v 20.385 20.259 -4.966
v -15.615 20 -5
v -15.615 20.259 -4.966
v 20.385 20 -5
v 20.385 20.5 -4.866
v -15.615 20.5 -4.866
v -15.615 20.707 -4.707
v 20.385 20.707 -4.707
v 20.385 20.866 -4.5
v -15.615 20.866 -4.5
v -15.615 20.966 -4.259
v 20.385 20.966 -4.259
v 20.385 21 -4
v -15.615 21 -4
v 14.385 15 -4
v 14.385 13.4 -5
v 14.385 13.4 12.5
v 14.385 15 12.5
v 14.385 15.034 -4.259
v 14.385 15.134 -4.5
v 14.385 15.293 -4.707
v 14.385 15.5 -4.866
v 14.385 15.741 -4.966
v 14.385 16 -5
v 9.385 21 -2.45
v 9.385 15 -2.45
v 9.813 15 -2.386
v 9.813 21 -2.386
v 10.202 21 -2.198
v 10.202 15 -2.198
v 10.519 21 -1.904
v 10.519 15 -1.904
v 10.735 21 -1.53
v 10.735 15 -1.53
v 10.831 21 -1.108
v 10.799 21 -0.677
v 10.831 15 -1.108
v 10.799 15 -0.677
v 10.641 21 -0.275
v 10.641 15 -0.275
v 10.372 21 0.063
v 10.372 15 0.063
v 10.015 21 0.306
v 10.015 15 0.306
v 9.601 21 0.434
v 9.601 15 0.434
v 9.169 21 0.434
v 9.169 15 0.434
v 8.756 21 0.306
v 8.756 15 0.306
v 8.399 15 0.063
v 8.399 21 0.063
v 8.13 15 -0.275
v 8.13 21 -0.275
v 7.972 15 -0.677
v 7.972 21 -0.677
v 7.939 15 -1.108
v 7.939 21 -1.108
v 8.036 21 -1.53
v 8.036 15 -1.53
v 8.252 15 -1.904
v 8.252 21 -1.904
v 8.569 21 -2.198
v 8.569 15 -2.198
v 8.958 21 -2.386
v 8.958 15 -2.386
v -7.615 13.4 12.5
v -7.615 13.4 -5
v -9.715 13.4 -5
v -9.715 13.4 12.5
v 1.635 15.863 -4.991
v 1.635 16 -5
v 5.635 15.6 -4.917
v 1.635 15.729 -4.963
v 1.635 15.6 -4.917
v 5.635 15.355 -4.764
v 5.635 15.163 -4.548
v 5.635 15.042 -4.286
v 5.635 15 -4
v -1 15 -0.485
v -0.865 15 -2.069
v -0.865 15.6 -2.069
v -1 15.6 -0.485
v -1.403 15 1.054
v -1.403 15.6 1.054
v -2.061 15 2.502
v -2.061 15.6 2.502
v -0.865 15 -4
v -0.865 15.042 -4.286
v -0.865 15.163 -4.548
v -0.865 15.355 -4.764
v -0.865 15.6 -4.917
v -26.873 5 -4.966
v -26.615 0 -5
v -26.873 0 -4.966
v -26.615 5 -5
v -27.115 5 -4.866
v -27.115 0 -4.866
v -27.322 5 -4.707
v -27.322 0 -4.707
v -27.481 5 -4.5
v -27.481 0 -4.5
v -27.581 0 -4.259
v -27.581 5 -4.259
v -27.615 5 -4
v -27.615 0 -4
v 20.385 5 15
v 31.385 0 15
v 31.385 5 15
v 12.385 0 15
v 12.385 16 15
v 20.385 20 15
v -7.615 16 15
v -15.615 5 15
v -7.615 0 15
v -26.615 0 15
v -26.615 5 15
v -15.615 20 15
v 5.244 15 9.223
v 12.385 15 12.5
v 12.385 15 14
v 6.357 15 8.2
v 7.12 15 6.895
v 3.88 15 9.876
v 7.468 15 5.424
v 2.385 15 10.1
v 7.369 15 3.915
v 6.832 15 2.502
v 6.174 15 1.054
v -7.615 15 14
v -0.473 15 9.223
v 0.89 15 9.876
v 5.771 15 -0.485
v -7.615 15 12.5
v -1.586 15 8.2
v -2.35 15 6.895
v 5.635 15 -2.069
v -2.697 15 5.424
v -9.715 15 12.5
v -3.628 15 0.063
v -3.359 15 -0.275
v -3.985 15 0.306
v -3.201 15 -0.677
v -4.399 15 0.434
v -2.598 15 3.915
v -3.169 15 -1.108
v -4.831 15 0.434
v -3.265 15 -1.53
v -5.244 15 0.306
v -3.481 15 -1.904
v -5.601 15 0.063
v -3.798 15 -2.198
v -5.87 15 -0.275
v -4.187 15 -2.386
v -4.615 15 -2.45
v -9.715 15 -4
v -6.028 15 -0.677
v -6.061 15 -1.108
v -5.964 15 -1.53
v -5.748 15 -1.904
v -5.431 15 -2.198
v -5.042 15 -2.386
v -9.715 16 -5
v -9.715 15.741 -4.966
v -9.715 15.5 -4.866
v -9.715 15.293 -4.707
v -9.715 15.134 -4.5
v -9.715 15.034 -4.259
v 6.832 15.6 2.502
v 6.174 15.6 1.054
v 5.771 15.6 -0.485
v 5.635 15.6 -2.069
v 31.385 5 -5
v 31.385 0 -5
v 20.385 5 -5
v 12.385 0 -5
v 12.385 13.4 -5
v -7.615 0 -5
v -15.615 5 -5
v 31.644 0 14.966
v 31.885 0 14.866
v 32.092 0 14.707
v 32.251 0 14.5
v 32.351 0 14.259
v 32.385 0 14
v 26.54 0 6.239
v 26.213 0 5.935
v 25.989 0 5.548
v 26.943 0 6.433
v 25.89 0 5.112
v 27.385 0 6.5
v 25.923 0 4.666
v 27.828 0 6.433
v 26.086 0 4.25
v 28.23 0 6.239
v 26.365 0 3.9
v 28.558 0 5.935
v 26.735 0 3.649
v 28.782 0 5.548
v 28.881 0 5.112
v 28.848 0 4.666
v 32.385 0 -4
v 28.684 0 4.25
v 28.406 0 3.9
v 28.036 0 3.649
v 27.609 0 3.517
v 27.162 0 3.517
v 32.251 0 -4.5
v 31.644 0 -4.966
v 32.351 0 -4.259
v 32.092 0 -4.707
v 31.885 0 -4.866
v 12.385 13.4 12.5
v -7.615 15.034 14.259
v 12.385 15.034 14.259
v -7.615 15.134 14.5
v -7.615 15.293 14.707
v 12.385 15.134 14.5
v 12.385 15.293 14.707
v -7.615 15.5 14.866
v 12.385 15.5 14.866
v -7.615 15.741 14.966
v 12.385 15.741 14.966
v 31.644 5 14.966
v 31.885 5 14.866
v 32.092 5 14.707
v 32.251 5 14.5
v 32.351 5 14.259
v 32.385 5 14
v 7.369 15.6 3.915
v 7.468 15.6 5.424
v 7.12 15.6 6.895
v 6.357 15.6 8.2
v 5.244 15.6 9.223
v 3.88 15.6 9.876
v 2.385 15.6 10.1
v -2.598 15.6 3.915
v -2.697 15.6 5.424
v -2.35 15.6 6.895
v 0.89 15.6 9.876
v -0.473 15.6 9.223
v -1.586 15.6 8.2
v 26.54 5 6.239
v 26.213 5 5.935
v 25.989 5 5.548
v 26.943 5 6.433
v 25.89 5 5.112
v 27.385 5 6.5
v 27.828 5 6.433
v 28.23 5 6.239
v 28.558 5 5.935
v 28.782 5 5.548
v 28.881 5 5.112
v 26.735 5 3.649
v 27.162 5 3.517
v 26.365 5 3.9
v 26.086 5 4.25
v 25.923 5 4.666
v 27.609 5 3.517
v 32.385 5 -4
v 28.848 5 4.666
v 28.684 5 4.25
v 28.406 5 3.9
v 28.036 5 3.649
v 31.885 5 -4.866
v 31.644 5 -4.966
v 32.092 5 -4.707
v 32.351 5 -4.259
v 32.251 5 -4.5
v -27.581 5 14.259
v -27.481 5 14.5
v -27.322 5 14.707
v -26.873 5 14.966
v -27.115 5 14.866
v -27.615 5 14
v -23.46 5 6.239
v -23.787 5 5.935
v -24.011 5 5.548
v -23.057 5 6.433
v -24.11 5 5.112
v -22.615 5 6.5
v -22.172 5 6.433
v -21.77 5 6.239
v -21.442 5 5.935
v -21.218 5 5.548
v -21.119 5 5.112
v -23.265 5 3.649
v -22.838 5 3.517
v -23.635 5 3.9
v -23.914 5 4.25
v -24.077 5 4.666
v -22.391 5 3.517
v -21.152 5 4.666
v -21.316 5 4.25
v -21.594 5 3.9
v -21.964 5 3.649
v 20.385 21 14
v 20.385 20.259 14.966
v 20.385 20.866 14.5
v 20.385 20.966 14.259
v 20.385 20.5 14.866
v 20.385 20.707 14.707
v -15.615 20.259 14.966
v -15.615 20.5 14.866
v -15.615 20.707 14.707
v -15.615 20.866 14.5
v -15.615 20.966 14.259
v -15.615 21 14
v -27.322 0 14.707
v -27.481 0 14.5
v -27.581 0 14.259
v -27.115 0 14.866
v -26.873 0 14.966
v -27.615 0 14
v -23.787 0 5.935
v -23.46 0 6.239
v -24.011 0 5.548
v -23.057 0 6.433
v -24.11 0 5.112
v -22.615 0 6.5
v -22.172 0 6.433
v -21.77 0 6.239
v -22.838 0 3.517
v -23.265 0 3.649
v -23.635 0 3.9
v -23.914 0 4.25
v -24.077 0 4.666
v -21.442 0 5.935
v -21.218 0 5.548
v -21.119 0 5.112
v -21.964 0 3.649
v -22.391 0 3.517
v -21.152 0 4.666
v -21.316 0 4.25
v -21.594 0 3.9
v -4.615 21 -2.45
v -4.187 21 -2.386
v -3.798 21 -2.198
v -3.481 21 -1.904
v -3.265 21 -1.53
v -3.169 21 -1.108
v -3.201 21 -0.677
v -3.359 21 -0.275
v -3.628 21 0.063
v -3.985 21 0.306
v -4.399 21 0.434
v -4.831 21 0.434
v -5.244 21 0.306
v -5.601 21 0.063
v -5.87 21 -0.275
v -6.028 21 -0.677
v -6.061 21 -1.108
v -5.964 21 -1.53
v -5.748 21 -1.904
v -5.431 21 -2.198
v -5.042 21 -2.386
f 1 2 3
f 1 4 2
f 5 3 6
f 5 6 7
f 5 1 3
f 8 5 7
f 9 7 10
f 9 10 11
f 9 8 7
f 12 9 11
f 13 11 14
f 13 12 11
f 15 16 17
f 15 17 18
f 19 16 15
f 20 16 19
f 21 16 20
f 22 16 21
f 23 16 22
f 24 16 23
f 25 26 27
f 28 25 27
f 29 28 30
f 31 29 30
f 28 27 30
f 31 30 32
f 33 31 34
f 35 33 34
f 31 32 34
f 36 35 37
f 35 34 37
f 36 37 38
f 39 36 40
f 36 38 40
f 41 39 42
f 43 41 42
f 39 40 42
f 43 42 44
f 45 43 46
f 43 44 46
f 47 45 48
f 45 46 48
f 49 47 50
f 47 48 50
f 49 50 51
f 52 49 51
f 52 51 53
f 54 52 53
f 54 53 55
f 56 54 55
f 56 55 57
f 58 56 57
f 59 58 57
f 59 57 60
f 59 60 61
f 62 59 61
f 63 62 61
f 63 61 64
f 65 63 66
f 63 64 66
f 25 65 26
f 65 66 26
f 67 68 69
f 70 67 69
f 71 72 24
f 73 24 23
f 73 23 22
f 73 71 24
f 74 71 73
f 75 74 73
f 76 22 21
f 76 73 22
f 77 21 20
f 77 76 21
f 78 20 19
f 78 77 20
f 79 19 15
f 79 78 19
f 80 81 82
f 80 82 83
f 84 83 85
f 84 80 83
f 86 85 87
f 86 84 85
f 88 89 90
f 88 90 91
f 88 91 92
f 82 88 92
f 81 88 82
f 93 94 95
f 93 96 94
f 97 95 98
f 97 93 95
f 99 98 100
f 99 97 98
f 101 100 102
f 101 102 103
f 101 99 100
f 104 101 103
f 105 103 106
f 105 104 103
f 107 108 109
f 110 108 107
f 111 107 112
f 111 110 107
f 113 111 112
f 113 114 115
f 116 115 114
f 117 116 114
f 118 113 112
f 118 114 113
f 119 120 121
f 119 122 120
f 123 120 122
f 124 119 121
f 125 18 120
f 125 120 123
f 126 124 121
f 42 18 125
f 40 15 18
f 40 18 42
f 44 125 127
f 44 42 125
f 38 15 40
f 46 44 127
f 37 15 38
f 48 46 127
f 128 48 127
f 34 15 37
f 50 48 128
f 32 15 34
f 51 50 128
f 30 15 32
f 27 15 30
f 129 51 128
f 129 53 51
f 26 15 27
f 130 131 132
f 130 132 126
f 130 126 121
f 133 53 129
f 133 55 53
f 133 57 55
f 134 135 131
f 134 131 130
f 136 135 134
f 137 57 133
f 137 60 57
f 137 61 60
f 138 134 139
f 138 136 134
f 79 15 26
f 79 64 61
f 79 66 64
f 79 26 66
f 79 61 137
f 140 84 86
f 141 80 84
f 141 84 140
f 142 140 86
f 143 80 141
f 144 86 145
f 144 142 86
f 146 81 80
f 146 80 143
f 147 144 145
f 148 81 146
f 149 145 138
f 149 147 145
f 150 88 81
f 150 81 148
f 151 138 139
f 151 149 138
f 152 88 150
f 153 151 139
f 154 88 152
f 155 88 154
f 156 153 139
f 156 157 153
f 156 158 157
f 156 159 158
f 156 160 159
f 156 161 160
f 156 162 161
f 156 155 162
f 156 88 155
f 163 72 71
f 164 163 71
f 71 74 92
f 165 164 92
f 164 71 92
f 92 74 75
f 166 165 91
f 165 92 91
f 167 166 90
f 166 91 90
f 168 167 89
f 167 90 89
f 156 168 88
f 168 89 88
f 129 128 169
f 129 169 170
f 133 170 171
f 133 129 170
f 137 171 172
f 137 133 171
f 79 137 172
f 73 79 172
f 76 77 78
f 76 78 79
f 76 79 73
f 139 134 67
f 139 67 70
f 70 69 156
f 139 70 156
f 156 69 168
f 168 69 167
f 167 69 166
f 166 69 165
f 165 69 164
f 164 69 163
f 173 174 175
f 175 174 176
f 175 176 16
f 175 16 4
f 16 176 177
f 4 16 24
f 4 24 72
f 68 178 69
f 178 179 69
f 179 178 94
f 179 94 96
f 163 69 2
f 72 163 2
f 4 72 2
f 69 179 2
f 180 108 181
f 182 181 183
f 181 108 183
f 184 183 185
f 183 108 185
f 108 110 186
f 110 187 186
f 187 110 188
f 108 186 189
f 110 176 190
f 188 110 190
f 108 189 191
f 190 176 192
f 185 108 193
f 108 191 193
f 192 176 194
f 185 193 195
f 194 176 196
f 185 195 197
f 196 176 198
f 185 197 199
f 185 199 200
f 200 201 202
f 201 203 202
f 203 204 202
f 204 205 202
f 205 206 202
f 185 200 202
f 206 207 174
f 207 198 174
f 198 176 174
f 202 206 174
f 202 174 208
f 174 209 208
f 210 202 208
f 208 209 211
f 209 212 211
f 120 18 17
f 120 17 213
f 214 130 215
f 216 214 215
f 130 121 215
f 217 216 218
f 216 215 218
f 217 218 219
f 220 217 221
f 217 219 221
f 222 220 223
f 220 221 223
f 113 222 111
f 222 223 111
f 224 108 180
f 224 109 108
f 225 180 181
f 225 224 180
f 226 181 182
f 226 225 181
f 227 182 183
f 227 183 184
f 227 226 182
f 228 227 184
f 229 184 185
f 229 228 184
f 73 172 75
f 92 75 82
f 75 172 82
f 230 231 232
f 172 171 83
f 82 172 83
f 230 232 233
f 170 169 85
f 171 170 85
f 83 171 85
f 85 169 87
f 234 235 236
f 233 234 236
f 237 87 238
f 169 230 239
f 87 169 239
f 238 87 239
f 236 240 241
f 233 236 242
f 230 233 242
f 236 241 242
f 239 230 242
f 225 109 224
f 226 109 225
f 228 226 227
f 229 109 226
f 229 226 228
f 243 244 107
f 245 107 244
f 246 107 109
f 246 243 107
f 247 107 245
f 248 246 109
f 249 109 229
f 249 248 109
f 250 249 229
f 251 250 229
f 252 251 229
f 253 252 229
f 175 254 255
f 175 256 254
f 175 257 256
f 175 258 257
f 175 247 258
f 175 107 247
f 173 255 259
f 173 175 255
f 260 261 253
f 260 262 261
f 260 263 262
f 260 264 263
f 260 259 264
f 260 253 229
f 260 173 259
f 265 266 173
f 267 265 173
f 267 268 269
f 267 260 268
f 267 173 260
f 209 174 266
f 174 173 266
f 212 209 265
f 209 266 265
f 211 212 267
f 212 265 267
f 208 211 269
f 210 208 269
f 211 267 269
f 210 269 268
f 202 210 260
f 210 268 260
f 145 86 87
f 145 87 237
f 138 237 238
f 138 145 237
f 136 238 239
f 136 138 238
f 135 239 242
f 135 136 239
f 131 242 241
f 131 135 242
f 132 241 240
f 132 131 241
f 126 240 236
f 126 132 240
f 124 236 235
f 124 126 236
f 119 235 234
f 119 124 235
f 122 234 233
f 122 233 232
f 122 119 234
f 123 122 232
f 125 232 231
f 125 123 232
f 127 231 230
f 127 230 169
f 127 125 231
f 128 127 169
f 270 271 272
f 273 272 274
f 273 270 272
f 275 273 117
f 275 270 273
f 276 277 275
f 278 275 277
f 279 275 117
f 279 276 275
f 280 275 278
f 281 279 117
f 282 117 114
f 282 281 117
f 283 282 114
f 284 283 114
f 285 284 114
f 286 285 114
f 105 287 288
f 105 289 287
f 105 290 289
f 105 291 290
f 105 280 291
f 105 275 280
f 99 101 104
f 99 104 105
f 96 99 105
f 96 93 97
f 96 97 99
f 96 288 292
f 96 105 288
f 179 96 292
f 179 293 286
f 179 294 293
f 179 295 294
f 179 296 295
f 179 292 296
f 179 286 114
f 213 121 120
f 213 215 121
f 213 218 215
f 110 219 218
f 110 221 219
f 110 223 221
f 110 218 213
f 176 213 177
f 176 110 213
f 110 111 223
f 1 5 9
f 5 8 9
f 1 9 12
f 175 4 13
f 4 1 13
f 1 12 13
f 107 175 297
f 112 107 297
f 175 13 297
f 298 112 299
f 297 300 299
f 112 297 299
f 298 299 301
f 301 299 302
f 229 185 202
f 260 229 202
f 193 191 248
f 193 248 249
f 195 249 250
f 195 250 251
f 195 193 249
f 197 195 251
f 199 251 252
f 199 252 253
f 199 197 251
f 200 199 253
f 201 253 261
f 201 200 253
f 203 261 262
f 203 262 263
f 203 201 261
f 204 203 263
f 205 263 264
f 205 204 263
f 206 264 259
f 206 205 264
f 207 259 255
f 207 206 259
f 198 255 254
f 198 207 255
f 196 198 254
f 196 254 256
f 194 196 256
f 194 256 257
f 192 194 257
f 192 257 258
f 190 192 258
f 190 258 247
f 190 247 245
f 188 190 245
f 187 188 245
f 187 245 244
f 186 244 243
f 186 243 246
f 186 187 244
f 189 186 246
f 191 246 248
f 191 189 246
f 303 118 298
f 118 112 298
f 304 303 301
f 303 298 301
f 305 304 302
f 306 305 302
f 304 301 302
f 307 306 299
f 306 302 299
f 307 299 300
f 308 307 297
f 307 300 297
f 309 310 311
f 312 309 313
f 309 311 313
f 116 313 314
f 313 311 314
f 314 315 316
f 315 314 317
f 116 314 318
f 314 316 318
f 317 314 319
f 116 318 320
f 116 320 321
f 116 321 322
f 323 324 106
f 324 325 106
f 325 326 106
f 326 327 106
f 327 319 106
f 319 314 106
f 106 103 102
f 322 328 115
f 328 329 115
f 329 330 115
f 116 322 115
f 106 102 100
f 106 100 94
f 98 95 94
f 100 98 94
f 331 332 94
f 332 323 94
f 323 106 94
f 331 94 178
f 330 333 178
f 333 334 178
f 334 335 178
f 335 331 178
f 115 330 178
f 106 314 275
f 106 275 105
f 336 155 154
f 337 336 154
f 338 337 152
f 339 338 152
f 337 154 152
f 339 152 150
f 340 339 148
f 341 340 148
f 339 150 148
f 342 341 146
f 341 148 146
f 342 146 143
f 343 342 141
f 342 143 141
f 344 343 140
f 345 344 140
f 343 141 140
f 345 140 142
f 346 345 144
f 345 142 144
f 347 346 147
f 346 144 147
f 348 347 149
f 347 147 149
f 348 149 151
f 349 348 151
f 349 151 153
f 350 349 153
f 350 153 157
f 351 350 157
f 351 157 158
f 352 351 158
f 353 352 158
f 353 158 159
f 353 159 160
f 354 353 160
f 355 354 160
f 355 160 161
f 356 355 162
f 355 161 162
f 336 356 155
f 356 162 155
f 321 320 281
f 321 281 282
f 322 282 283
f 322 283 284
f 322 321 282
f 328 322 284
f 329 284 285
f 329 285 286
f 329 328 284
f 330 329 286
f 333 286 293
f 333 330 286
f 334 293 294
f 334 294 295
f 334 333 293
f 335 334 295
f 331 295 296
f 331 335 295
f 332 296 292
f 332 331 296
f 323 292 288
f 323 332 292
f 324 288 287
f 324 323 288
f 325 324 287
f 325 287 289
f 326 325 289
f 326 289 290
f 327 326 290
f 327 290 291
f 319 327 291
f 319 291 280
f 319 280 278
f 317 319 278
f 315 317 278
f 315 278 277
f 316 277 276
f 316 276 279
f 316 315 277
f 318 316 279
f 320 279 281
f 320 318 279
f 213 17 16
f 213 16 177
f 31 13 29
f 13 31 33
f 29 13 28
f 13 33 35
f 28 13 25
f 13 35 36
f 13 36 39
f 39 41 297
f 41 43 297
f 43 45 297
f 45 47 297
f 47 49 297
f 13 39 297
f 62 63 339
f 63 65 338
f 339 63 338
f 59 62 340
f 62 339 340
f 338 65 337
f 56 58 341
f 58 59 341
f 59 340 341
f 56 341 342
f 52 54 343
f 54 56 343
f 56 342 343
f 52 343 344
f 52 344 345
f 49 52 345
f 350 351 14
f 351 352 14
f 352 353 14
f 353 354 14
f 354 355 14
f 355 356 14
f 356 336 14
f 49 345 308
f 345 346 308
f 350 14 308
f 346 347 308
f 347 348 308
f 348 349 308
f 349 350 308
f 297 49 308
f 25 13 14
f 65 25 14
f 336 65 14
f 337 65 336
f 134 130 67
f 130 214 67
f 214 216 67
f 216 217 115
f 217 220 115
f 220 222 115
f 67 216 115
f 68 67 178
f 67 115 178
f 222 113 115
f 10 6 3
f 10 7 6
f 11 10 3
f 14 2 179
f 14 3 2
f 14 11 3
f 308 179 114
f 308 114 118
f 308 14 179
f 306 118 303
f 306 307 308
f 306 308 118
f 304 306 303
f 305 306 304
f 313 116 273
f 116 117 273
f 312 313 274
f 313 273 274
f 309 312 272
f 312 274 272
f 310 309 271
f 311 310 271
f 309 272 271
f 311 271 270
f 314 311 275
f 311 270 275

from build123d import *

# Parameters (mm, degrees)
SKETCH1_W             = 20
SKETCH1_H             = 20
SKETCH1_R             = 1.5
BOSS_EXTRUDE1_DEPTH   = 5
BOSS_EXTRUDE1_2_DEPTH = 5
SKETCH2_W             = 8
SKETCH2_H             = 20
BOSS_EXTRUDE2_DEPTH   = 10
SKETCH3_W             = 20
SKETCH3_H             = 6
BOSS_EXTRUDE3_DEPTH   = 36
CUT_EXTRUDE1_DEPTH    = 0.6
SKETCH6_W             = 24.1
SKETCH6_H             = 1.6
CUT_EXTRUDE2_DEPTH    = 17.5
FILLET1_R             = 1
SKETCH8_R             = 1.45
CUT_EXTRUDE3_DEPTH    = 6
FILLET2_R             = 1


# Some blends are built 0.0001 mm under size
with BuildPart() as part:
    # Sketch1 → Boss-Extrude1 (new body)
    with BuildSketch(Plane(origin=(0, 0, 0), x_dir=(1, 0, 0), z_dir=(0, 1, 0))):
        with Locations((-17.614620188, -5)):
            Rectangle(SKETCH1_W, SKETCH1_H)
        with Locations(Location((-22.614620188, -5, 0), (0, 0, 270))):
            Circle(SKETCH1_R, mode=Mode.SUBTRACT)
    extrude(amount=BOSS_EXTRUDE1_DEPTH)



with BuildPart() as body_2:
    # Sketch1 → Boss-Extrude1 2 (new body)
    with BuildSketch(Plane(origin=(0, 0, 0), x_dir=(1, 0, 0), z_dir=(0, 1, 0))):
        with Locations((22.385379812, -5)):
            Rectangle(SKETCH1_W, SKETCH1_H)
        with Locations(Location((27.385379812, -5, 0), (0, 0, 270))):
            Circle(SKETCH1_R, mode=Mode.SUBTRACT)
    extrude(amount=BOSS_EXTRUDE1_2_DEPTH)


with BuildPart() as part_1:
    add(part.part)

    add(body_2.part)  # Boss-Extrude2 merges body 2
    # Sketch2 → Boss-Extrude2 (add)
    with BuildSketch(Plane(origin=(0, 5, 0), x_dir=(1, 0, 0), z_dir=(0, 1, 0))):
        with Locations((-11.614620188, -5)):
            Rectangle(SKETCH2_W, SKETCH2_H)
        with Locations((16.385379812, -5)):
            Rectangle(SKETCH2_W, SKETCH2_H)
    extrude(amount=BOSS_EXTRUDE2_DEPTH)

    # Sketch3 → Boss-Extrude3 (add)
    with BuildSketch(Plane.ZY.offset(15.614620188)):
        with Locations((5, 18)):
            Rectangle(SKETCH3_W, SKETCH3_H)
    extrude(amount=-BOSS_EXTRUDE3_DEPTH)

    # Sketch4 → Cut-Extrude1 (cut)
    with BuildSketch(Plane.XZ.offset(-15)):
        with BuildLine():
            Line((5.635379812, -2.069256579), (5.635379812, -13.54882393))
            Line((5.635379812, -13.54882393), (-0.864620188, -13.54882393))
            Line((-0.864620188, -13.54882393), (-0.864620188, -2.069256579))
            ThreePointArc((-0.864620188, -2.069256579), (-1.168628736, 0.293230663), (-2.06084614, 2.501785681))
            ThreePointArc((-2.06084614, 2.501785681), (2.385379812, 10.1), (6.831605764, 2.501785681))
            ThreePointArc((6.831605764, 2.501785681), (5.93938836, 0.293230663), (5.635379812, -2.069256579))
        make_face()
    extrude(amount=-CUT_EXTRUDE1_DEPTH, mode=Mode.SUBTRACT)

    # Sketch6 → Cut-Extrude2 (cut)
    with BuildSketch(Plane(origin=(0, 0, -5), x_dir=(-1, 0, 0), z_dir=(0, 0, -1))):
        with Locations((-2.335379812, 14.2)):
            Rectangle(SKETCH6_W, SKETCH6_H)
    extrude(amount=-CUT_EXTRUDE2_DEPTH, mode=Mode.SUBTRACT)

    # Fillet1
    fillet1_edges = [part_1.edges().sort_by_distance(p)[0] for p in [
        (2.385379812, 21, -5),
        (2.385379812, 21, 15),
        (32.385379812, 2.5, 15),
        (32.385379812, 2.5, -5),
        (-27.614620188, 2.5, -5),
        (-27.614620188, 2.5, 15),
    ]]
    fillet(fillet1_edges, radius=FILLET1_R)

    # Sketch8 → Cut-Extrude3 (cut)
    with BuildSketch(Plane(origin=(0, 15, 0), x_dir=(-1, 0, 0), z_dir=(0, -1, 0))):
        with Locations(Location((4.614620188, 1, 0), (0, 0, 90))):
            Circle(SKETCH8_R)
        with Locations(Location((-9.385379812, 1, 0), (0, 0, 90))):
            Circle(SKETCH8_R)
    extrude(amount=-CUT_EXTRUDE3_DEPTH, mode=Mode.SUBTRACT)

    # Fillet2
    fillet2_edges = [part_1.edges().sort_by_distance(p)[0] for p in [
        (2.385379812, 15, 15),
    ]]
    fillet(fillet2_edges, radius=FILLET2_R)
    # the kernel refuses this fillet: 1 mm, written as the material it takes off along each edge
    with BuildSketch(Plane(origin=(1.635379812, 15, -5), x_dir=(0, 0, 1), z_dir=(-1, 0, 0))) as fillet2_2_piece_1:
        with BuildLine():
            CenterArc((FILLET2_R, FILLET2_R), FILLET2_R, 180, 90)
            Line((0, FILLET2_R), (-FILLET2_R * 0.02, FILLET2_R))
            Line((-FILLET2_R * 0.02, FILLET2_R), (-FILLET2_R * 0.02, -FILLET2_R * 0.02))
            Line((-FILLET2_R * 0.02, -FILLET2_R * 0.02), (FILLET2_R, -FILLET2_R * 0.02))
            Line((FILLET2_R, -FILLET2_R * 0.02), (FILLET2_R, 0))
        make_face()
    extrude(amount=11.35, mode=Mode.SUBTRACT)
    fillet2_3_edges = [part_1.edges().sort_by_distance(p)[0] for p in [
        (10.010379812, 15, -5),
    ]]
    fillet(fillet2_3_edges, radius=FILLET2_R - 0.0001)  # a hair under: the kernel refuses the full size


solid = part_1.part
